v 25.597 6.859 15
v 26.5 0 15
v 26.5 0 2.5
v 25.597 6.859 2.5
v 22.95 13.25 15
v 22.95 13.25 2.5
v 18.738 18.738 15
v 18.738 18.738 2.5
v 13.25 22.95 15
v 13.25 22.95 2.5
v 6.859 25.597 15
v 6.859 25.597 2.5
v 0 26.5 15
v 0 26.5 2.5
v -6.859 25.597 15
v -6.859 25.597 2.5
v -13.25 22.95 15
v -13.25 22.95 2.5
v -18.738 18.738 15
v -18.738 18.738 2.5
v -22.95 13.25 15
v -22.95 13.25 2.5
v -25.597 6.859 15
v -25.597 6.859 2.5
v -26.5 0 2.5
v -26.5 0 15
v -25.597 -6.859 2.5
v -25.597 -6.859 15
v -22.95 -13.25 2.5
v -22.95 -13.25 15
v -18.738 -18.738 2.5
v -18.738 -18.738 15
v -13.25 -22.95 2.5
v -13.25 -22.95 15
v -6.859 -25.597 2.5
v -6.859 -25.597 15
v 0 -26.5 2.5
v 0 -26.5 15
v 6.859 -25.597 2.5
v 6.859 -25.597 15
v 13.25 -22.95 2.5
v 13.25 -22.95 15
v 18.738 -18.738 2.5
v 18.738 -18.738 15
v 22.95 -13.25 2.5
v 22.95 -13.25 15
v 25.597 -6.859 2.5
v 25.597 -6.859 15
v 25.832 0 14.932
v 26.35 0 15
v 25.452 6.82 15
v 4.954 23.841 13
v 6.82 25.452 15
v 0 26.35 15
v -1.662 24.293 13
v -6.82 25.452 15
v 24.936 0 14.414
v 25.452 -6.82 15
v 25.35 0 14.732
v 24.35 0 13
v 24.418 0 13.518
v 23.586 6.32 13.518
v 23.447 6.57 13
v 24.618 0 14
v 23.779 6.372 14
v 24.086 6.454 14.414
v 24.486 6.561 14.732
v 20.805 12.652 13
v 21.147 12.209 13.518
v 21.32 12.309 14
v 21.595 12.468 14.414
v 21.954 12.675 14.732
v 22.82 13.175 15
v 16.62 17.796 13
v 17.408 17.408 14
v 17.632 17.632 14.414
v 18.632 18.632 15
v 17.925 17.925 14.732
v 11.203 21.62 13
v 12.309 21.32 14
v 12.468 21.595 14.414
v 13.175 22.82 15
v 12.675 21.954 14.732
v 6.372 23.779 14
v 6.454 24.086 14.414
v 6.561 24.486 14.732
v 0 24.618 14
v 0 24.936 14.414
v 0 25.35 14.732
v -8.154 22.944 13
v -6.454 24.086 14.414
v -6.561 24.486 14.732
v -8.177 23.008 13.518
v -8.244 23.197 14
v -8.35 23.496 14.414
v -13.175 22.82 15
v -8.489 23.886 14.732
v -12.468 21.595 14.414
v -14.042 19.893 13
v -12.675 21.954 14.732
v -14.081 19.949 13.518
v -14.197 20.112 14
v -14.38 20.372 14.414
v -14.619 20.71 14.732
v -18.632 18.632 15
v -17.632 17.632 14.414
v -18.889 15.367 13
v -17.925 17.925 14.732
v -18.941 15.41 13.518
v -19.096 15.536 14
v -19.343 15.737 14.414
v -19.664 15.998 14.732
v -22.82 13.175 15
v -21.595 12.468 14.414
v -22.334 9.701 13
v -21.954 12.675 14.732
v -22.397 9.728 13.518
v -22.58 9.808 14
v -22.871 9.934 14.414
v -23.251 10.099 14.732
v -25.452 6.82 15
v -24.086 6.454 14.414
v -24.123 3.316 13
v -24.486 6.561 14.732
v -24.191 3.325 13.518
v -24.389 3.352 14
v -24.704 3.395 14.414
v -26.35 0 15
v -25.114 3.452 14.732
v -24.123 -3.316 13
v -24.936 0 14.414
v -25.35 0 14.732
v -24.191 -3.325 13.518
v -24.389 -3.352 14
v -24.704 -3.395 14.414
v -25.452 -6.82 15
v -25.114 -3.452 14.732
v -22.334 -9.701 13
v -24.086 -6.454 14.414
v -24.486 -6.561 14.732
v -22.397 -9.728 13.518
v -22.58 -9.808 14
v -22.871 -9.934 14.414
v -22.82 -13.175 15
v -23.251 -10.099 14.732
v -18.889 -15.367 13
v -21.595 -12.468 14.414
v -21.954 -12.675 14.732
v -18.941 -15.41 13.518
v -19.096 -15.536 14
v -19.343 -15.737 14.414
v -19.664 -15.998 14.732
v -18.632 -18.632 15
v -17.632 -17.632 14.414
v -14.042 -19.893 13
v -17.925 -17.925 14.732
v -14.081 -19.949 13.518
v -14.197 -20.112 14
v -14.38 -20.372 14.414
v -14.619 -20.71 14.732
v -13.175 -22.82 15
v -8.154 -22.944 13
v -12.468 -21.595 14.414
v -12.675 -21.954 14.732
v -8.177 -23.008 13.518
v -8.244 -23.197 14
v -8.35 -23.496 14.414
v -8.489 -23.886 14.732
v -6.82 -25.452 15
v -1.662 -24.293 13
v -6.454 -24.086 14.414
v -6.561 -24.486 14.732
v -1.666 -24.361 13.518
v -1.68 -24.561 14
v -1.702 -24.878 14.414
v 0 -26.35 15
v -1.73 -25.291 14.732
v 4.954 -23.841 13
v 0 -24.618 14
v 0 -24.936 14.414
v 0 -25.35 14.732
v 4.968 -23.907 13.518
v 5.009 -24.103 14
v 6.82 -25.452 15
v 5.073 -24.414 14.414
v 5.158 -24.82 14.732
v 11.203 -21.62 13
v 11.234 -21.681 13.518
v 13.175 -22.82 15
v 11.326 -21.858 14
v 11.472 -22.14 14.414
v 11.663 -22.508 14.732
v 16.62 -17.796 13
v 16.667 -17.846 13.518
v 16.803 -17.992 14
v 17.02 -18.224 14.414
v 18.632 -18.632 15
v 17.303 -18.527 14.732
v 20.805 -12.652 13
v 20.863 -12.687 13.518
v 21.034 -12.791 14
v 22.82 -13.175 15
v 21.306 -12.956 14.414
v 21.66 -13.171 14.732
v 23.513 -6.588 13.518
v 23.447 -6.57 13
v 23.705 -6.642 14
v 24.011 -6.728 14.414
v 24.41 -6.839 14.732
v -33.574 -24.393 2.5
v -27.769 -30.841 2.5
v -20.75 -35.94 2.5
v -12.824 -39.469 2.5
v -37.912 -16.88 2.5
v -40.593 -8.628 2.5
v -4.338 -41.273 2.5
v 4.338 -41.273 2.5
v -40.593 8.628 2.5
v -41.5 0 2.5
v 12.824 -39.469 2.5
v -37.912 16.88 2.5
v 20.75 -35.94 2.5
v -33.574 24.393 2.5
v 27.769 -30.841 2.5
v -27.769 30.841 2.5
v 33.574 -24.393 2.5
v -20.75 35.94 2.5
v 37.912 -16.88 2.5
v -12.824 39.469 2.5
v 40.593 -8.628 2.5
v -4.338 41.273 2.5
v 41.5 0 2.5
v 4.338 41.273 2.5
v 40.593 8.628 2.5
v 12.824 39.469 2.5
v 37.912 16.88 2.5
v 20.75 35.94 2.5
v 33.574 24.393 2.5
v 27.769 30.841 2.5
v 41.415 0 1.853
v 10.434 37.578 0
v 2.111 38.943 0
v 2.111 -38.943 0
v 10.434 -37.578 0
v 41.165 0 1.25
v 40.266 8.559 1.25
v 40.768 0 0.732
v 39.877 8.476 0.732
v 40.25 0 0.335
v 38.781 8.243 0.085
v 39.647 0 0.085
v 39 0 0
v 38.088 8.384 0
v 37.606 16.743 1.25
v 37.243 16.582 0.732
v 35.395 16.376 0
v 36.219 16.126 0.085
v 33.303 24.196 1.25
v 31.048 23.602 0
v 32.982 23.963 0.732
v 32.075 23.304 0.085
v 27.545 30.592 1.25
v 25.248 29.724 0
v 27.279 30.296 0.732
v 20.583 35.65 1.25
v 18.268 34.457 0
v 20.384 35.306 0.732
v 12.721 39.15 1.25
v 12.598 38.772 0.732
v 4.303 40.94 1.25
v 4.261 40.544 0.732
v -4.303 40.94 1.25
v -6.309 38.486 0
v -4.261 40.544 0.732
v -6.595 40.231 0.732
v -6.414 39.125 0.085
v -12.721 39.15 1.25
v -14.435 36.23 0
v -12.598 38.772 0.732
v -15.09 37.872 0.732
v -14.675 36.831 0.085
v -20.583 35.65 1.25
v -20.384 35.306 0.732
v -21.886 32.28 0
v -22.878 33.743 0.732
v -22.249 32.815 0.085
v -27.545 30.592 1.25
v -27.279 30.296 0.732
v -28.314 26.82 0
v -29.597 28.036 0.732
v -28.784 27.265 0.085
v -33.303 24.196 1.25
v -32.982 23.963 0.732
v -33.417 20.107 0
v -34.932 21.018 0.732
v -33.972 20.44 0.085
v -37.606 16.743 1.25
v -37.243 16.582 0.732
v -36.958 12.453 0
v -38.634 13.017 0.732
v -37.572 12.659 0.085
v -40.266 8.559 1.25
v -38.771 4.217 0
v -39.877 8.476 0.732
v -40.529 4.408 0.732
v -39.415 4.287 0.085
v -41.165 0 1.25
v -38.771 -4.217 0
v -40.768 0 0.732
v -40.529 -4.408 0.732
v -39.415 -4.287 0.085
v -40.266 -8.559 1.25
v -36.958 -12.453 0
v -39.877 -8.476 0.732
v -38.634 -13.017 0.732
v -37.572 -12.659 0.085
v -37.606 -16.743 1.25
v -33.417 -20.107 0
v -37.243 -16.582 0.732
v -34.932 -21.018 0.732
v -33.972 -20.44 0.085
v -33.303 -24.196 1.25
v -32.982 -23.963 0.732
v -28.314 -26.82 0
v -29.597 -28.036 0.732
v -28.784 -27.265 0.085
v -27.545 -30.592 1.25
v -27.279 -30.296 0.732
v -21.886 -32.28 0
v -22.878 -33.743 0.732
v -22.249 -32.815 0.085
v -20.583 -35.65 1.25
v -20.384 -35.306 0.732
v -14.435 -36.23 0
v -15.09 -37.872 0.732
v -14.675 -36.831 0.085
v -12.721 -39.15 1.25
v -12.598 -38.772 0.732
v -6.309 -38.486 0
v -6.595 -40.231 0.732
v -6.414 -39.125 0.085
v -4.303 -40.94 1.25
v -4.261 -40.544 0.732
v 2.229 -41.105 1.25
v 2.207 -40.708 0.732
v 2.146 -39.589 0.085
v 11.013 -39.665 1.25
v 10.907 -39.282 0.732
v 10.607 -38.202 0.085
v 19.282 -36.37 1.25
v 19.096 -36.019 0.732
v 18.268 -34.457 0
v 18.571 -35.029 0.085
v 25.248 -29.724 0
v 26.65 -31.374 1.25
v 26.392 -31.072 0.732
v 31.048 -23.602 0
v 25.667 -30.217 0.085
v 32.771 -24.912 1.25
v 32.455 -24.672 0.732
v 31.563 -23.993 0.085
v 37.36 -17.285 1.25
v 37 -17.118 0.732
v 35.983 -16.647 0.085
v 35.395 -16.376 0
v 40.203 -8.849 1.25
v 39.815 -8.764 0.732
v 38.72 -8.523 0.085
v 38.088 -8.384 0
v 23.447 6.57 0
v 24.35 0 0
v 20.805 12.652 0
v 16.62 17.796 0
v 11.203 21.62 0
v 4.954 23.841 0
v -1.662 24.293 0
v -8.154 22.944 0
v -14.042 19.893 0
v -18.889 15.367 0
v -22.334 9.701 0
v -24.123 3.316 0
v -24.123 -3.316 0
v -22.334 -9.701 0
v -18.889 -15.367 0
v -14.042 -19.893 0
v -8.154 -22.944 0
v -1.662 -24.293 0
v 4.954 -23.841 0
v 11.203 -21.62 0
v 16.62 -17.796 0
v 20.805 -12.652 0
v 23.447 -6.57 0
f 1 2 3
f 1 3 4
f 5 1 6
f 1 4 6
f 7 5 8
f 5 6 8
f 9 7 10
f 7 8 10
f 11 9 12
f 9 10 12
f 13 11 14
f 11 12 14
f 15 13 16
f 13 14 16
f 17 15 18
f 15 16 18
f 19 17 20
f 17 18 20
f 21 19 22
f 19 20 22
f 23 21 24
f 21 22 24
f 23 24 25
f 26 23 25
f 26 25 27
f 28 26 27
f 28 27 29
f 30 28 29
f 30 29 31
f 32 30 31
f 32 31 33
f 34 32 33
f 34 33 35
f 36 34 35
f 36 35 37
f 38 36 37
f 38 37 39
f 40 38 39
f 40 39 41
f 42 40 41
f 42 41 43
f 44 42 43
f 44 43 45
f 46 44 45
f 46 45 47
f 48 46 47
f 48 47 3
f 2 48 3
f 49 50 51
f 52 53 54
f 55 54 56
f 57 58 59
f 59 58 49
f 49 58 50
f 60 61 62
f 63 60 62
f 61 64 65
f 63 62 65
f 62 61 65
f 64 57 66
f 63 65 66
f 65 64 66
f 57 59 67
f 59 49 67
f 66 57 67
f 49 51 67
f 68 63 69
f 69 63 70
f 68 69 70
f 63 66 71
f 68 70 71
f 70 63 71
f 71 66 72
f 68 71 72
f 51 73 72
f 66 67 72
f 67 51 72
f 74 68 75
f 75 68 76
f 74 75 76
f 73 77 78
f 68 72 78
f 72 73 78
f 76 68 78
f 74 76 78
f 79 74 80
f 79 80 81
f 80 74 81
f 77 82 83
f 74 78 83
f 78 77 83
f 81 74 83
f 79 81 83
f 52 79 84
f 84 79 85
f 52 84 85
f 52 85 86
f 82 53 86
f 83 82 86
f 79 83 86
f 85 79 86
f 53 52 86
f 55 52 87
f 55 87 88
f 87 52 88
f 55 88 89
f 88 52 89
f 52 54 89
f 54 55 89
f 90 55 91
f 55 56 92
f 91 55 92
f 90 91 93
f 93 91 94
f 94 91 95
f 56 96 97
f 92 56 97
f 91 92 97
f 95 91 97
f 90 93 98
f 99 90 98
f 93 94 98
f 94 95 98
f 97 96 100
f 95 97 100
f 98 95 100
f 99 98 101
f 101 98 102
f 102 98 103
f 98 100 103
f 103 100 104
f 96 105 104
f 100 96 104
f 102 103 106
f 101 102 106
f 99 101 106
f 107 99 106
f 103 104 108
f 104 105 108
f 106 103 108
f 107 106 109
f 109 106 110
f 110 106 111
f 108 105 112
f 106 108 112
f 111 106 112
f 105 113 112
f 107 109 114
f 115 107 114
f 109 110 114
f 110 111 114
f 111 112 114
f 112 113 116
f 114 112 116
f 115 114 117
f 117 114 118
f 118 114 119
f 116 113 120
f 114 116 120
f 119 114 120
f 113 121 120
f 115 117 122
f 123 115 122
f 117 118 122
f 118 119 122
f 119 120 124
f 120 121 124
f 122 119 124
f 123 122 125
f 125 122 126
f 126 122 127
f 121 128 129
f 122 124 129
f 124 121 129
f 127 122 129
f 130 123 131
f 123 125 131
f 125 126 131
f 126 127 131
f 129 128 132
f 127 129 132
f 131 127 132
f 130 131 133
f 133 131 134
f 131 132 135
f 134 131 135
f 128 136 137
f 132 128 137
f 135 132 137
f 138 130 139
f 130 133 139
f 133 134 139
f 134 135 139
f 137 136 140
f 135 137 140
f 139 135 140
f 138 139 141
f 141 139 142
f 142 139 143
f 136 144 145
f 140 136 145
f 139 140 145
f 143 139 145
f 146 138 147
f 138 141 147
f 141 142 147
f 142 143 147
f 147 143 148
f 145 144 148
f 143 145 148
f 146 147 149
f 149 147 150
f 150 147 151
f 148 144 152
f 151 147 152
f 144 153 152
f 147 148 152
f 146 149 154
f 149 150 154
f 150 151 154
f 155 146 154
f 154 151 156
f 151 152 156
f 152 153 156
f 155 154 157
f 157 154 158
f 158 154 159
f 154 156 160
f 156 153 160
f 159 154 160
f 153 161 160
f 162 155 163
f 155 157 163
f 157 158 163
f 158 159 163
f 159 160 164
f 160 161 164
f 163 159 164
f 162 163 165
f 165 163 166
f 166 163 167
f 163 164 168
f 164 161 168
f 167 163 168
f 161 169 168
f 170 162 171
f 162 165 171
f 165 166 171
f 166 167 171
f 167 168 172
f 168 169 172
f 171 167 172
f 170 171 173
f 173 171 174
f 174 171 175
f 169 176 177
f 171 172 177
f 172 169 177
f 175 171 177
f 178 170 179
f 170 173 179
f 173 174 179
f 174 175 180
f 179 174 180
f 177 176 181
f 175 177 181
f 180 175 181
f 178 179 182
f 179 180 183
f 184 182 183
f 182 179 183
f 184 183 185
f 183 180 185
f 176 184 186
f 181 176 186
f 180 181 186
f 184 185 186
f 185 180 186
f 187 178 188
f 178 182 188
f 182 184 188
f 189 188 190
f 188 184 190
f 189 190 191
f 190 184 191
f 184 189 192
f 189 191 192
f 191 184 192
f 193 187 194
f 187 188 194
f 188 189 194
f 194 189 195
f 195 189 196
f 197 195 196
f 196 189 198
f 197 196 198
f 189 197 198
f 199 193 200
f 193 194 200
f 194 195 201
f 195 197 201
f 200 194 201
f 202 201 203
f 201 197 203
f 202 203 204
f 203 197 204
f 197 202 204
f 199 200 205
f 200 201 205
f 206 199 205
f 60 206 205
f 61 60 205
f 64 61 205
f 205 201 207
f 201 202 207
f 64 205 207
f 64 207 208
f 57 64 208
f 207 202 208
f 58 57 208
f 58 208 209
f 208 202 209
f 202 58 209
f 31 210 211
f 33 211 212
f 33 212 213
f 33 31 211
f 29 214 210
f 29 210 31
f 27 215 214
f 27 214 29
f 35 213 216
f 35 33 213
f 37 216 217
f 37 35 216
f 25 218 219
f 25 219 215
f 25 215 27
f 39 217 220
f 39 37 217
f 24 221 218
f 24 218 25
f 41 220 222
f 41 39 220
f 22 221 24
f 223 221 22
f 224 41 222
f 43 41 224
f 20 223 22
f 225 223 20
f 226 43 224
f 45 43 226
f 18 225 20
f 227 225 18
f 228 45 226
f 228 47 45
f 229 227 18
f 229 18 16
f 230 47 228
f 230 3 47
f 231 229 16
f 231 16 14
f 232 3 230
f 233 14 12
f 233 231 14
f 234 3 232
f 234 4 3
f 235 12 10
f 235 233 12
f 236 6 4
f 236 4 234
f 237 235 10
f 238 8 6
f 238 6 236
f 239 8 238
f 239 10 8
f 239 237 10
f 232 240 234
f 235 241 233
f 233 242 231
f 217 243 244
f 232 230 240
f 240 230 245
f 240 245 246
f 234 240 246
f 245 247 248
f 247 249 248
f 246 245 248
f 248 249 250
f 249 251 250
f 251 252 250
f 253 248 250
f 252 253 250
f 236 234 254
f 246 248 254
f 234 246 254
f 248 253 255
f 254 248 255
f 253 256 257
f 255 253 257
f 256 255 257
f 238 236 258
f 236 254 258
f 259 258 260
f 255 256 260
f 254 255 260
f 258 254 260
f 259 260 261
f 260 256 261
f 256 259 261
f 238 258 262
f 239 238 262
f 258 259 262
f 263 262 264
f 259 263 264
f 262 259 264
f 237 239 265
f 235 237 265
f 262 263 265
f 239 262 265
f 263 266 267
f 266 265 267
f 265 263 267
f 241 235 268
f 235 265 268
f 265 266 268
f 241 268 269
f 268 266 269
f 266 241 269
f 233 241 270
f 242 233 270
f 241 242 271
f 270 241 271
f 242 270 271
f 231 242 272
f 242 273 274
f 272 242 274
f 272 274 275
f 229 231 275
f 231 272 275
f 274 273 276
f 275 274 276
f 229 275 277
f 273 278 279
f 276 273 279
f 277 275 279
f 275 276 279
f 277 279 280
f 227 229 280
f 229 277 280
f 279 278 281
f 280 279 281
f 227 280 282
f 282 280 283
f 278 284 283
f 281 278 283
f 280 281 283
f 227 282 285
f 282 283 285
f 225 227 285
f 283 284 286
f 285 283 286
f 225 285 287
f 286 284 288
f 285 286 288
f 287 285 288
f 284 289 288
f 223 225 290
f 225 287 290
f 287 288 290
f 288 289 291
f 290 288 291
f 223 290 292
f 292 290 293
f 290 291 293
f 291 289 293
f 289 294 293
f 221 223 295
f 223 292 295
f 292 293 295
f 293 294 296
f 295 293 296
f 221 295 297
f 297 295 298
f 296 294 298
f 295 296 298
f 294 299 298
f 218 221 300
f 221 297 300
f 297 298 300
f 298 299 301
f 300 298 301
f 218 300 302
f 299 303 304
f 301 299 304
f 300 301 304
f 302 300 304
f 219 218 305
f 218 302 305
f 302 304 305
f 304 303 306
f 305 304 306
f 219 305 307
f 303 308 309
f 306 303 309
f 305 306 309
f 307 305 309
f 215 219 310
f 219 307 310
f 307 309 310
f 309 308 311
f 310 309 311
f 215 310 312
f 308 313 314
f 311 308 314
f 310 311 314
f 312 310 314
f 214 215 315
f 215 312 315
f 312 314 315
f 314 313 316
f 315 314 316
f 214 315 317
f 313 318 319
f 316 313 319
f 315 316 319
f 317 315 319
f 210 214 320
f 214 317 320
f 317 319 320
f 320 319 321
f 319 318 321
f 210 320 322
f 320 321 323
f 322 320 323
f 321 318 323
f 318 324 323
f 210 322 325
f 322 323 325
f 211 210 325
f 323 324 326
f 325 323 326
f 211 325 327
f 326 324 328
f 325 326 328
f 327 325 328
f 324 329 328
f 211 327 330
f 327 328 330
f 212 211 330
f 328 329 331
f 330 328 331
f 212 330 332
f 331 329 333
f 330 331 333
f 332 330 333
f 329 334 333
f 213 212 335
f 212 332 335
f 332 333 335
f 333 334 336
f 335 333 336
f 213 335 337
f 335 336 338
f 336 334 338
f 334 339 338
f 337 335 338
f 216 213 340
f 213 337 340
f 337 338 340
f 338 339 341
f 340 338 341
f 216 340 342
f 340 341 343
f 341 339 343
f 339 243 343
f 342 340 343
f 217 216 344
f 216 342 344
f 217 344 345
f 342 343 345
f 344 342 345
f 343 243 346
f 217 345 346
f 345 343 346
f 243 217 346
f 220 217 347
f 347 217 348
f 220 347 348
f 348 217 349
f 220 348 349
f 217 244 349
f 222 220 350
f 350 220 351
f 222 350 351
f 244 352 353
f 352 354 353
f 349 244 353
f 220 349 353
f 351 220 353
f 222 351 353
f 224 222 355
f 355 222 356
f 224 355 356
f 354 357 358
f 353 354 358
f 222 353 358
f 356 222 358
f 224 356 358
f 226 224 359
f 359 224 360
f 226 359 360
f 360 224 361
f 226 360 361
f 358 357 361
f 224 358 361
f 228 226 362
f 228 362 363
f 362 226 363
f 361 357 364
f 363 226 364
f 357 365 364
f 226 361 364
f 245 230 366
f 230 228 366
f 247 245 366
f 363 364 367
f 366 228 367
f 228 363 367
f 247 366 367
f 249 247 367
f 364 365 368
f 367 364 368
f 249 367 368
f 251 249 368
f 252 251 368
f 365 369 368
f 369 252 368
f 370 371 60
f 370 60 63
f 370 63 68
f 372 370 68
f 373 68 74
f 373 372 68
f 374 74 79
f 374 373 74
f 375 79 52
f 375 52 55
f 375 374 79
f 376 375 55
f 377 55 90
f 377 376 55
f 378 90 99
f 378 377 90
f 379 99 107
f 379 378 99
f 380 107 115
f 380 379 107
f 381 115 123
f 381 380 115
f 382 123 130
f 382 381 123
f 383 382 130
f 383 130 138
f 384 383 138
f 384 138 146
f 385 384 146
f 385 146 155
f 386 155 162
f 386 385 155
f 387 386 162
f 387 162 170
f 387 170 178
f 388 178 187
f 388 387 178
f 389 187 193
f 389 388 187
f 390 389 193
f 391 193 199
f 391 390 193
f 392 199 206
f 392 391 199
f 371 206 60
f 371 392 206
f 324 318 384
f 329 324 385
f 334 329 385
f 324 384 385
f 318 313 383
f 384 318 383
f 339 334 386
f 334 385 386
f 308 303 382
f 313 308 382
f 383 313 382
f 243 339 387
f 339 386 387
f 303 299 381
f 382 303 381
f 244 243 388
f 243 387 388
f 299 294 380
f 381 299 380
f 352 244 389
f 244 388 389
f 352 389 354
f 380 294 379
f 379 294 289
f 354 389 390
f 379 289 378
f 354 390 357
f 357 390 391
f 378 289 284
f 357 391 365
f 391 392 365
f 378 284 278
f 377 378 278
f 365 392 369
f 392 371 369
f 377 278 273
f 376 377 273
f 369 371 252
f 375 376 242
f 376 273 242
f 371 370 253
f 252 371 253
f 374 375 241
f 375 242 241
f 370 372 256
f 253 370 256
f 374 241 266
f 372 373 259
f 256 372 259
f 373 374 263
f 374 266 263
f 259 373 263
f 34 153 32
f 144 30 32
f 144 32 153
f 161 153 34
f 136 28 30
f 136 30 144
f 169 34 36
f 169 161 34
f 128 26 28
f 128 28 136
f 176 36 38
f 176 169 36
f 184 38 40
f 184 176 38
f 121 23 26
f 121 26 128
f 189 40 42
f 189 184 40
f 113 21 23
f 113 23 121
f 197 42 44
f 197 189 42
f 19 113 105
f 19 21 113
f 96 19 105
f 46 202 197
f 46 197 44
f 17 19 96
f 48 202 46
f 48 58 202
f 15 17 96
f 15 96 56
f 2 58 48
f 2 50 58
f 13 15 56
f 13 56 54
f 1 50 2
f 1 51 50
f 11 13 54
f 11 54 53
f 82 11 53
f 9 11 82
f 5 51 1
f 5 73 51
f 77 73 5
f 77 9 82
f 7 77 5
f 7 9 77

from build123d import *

# Parameters (mm, degrees)
F0_R     = 41.5
F0_R_2   = 26.5
F1_DEPTH = 2.5
F0_R_3   = 24.35
F2_DEPTH = 15
F3_R     = 2.49999
F4_R     = 2


# Not quite as in the source:
# - a fillet or chamfer is up to 0.001 mm smaller than in the source, because OpenCascade refuses the exact size


with BuildPart() as f1:
    # F0 (on Top) → F1 (new body)
    with BuildSketch(Plane.XY):
        Circle(F0_R)
        Circle(F0_R_2, mode=Mode.SUBTRACT)
    extrude(amount=F1_DEPTH)

    # F0 (on Top) → F2 (join)
    with BuildSketch(Plane.XY):
        Circle(F0_R_2)
        Circle(F0_R_3, mode=Mode.SUBTRACT)
    extrude(amount=F2_DEPTH)

    # F3 (radius 2.5 in the source; OpenCascade refuses exactly that, so slightly less here)
    f3_edges = [f1.edges().sort_by_distance(p)[0] for p in [
        (-41.5, 0, 0),
    ]]
    fillet(f3_edges, radius=F3_R)

    # F4
    f4_edges = [f1.edges().sort_by_distance(p)[0] for p in [
        (-24.35, 0, 15),
    ]]
    fillet(f4_edges, radius=F4_R)


solid = f1.part
